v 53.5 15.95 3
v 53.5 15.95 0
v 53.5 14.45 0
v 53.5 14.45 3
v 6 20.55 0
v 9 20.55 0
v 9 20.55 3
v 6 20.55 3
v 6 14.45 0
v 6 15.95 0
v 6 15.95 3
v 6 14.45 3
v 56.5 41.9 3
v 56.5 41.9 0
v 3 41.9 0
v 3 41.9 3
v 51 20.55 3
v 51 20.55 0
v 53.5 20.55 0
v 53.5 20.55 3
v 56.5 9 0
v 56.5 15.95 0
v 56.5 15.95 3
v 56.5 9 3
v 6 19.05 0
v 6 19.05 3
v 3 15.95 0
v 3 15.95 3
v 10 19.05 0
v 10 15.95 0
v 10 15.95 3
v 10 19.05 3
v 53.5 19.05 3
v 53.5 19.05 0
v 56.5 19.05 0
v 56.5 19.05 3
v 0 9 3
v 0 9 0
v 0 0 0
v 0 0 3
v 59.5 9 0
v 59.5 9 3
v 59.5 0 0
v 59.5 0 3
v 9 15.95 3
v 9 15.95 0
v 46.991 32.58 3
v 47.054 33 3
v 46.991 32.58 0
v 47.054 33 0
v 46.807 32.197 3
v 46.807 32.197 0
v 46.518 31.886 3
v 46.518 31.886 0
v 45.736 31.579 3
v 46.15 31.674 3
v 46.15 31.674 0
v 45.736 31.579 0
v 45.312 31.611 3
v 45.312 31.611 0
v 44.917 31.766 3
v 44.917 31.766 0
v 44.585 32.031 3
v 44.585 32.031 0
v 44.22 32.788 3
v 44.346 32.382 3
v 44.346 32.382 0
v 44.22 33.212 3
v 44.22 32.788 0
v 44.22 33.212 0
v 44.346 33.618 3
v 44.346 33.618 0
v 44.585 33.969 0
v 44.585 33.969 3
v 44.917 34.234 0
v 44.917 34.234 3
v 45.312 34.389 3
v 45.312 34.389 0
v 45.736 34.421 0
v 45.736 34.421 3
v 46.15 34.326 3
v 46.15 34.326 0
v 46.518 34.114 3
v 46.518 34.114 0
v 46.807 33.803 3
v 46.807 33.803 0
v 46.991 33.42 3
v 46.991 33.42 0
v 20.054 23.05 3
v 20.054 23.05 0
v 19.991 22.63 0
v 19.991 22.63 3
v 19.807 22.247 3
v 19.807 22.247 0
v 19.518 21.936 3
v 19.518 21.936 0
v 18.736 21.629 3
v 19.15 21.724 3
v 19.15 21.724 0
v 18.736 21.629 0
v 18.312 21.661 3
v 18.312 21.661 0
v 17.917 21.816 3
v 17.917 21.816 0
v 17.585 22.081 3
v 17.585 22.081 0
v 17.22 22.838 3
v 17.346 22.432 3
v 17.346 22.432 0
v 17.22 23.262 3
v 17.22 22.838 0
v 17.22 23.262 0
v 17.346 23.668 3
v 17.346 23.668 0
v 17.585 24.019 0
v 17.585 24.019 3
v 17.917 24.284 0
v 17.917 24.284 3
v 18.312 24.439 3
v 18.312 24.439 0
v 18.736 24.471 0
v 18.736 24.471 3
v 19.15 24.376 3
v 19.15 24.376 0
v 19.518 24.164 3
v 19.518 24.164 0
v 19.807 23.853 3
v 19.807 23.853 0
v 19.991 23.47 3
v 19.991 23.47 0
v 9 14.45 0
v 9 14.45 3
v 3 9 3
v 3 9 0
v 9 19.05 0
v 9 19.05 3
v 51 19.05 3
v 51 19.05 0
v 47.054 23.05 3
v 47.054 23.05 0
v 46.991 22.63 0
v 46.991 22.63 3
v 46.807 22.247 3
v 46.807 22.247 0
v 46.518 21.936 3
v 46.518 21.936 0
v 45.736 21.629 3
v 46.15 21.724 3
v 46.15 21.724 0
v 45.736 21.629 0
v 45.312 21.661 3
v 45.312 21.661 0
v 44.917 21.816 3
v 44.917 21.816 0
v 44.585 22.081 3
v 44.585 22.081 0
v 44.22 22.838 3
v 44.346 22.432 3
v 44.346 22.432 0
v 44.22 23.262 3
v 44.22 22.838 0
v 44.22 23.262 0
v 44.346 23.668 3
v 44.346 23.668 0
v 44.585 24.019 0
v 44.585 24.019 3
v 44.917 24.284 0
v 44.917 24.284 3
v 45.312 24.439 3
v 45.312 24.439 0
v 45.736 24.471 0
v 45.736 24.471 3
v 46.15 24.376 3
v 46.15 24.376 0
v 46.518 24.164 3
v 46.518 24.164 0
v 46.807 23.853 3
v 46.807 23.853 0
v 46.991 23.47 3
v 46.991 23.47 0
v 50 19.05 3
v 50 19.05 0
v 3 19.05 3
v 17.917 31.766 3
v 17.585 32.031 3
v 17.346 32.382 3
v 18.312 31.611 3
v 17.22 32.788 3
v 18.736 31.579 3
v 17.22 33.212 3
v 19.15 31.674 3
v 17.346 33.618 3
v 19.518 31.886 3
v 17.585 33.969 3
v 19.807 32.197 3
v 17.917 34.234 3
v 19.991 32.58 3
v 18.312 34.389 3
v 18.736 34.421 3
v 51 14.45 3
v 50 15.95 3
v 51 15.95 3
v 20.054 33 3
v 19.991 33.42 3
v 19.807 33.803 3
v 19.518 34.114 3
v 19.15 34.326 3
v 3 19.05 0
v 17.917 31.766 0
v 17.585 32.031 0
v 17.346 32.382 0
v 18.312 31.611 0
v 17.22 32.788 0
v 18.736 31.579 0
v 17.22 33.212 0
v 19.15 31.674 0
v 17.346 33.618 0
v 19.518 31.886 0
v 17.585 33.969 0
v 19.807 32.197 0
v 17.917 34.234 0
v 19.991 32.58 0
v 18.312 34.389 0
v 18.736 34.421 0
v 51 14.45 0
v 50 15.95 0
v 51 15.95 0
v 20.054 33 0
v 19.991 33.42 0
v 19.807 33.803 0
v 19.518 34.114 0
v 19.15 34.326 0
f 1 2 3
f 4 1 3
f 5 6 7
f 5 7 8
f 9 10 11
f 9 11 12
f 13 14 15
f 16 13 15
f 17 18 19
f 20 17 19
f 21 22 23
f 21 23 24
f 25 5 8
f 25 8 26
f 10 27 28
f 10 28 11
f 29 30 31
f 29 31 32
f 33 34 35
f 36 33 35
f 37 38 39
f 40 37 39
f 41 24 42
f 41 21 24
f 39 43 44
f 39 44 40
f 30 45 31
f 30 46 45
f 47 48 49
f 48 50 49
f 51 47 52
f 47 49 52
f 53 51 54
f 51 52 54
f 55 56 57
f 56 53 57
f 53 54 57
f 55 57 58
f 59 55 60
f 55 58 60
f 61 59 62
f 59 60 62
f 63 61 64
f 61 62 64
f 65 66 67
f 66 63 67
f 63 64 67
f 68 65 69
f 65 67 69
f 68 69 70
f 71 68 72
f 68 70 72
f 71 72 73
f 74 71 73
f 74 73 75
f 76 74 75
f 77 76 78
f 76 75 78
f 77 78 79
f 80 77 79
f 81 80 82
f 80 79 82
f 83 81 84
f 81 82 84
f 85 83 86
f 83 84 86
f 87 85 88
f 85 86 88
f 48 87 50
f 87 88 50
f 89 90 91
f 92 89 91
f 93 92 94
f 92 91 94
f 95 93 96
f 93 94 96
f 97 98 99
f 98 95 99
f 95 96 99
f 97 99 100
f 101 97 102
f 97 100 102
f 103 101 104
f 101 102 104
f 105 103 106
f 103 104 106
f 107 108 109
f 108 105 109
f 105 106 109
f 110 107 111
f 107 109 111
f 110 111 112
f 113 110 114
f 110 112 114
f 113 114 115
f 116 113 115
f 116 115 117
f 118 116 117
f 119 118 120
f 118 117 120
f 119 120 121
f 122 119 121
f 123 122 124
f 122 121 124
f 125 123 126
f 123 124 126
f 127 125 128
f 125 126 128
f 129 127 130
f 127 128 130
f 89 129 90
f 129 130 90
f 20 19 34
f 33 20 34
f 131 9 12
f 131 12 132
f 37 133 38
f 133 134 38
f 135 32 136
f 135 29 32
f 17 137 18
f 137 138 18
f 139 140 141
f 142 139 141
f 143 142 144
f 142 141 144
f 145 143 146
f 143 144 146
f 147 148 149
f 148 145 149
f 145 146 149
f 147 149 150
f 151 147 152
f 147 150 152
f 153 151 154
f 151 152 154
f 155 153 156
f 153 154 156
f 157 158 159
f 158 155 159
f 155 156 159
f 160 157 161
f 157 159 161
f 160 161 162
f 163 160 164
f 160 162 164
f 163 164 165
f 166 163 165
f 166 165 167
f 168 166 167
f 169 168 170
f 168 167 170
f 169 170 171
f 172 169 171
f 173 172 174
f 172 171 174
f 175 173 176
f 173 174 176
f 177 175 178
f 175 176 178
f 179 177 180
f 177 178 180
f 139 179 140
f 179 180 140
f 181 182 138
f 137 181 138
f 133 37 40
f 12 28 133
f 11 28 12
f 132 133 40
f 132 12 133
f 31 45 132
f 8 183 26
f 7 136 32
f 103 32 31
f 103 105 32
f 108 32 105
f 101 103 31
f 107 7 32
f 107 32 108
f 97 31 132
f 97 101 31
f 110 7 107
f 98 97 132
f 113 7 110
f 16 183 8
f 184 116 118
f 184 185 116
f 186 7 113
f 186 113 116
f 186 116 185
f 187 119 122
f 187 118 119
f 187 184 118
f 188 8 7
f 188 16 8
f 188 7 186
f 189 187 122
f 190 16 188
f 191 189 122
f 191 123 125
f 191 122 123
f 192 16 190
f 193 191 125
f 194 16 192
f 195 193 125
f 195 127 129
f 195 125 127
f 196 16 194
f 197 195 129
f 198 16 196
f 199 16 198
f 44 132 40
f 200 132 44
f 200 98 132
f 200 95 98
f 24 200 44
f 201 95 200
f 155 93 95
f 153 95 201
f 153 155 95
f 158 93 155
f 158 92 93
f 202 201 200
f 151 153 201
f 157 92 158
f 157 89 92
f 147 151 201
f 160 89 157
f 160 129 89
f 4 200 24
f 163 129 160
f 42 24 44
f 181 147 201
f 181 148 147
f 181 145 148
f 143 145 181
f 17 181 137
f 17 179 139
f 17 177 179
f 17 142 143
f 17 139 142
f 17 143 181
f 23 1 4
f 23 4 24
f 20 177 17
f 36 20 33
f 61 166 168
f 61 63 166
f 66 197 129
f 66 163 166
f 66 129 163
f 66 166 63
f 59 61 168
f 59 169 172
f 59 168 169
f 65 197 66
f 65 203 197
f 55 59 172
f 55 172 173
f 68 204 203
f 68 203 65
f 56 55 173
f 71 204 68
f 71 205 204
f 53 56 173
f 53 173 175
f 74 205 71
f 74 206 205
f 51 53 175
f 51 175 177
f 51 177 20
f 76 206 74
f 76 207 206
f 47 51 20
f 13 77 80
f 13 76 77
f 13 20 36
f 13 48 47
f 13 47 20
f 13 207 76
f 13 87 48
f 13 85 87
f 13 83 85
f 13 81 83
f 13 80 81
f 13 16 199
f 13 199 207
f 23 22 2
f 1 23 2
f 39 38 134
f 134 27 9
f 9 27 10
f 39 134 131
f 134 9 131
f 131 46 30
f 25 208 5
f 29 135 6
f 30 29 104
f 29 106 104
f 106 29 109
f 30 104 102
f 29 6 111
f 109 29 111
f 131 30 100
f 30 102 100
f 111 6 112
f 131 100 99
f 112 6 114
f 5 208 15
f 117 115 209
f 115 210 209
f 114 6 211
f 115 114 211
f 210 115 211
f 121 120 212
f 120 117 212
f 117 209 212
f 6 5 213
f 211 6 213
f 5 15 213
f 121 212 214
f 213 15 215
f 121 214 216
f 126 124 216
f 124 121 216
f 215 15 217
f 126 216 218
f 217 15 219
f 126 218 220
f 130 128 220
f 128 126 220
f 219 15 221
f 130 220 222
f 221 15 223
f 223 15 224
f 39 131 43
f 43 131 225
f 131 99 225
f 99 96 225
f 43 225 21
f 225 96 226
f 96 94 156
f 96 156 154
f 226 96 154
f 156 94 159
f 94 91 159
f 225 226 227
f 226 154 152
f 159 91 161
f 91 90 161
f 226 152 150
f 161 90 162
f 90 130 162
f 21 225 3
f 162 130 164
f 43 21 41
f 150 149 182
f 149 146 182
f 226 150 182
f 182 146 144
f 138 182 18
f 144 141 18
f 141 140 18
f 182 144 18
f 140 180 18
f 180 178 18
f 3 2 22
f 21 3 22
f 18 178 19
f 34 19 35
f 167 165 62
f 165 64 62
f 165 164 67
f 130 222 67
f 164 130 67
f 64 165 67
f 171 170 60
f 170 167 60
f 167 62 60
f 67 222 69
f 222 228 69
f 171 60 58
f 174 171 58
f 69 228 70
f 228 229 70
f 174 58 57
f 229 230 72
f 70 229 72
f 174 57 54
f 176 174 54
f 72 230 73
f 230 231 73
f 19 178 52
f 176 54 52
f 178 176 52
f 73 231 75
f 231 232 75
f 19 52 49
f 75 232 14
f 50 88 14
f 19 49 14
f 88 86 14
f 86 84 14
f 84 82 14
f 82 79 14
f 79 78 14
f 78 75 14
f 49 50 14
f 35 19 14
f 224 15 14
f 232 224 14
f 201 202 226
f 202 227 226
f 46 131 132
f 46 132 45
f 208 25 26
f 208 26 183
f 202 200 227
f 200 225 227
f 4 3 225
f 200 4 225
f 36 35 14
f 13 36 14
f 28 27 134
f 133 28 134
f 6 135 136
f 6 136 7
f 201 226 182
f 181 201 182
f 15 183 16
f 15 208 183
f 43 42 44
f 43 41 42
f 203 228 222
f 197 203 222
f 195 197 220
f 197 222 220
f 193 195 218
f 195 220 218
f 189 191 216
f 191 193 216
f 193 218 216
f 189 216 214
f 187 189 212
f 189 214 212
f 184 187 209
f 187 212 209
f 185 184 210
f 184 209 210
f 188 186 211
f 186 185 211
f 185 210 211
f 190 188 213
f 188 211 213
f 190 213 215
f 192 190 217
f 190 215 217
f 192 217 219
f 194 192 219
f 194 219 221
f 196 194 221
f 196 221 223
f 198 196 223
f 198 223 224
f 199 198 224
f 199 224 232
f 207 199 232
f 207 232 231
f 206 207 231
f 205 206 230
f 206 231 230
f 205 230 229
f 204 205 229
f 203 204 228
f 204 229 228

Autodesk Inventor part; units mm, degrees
ref_plane "YZ Plane" through (0, 0, 0) normal (1, 0, 0) x (0, 1, 0)
ref_plane "XZ Plane" through (0, 0, 0) normal (0, 1, 0) x (-1, 0, 0)
ref_plane "XY Plane" through (0, 0, 0) normal (0, 0, 1) x (1, 0, 0)
sketch "Sketch1" plane through (0, 0, 0) normal (0, 0, 1) x (1, 0, 0)
  line L0 (50, 15.95) -> (50, 19.05)
  line L1 (56.5, 15.95) -> (53.5, 15.95)
  line L2 (51, 15.95) -> (51, 15.95)
  line L3 (53.5, 14.45) -> (51, 14.45)
  line L4 (51, 20.55) -> (53.5, 20.55)
  line L5 (51, 14.45) -> (51, 15.95)
  line L6 (51, 19.05) -> (51, 20.55)
  line L7 (50, 19.05) -> (51, 19.05)
  line L8 (53.5, 19.05) -> (56.5, 19.05)
  line L9 (56.5, 15.95) -> (53.5, 15.95)
  line L10 (51, 15.95) -> (50, 15.95)
  line L11 (53.5, 20.55) -> (53.5, 19.05)
  line L12 (53.5, 15.95) -> (53.5, 14.45)
  line L13 (10, 15.95) -> (10, 19.05)
  line L14 (10, 19.05) -> (9, 19.05)
  line L15 (9, 14.45) -> (9, 15.95)
  line L16 (9, 19.05) -> (9, 20.55)
  line L17 (6, 20.55) -> (6, 19.05)
  line L18 (9, 20.55) -> (6, 20.55)
  line L19 (6, 15.95) -> (6, 14.45)
  line L20 (6, 19.05) -> (3, 19.05)
  line L21 (3, 15.95) -> (6, 15.95)
  line L22 (3, 15.95) -> (6, 15.95)
  line L23 (6, 14.45) -> (9, 14.45)
  line L24 (56.5, 19.05) -> (56.5, 41.9)
  line L25 (3, 15.95) -> (3, 9)
  line L26 (3, 9) -> (0, 9)
  line L27 (0, 9) -> (0, 0)
  line L28 (3, 19.05) -> (3, 41.9)
  line L29 (56.5, 41.9) -> (3, 41.9)
  line L30 (9, 15.95) -> (10, 15.95)
  line L31 (56.5, 15.95) -> (56.5, 9)
  line L32 (56.5, 9) -> (59.5, 9)
  line L33 (59.5, 9) -> (59.5, 0)
  line L34 (59.5, 0) -> (0, 0)
  circle A0 centre (45.6295, 23.05) radius 1.425 projected
  circle A1 centre (18.6295, 23.05) radius 1.425 projected
  circle A2 centre (18.6295, 33) radius 1.425 projected
  circle A3 centre (45.6295, 33) radius 1.425 projected
  circle A4 centre (45.6295, 23.05) radius 1.425
  circle A5 centre (45.6295, 33) radius 1.425
  circle A6 centre (18.6295, 33) radius 1.425
  circle A7 centre (18.6295, 23.05) radius 1.425
  line L35 (59.5, 9) -> (59.5, 17.5) construction
  line L36 (59.5, 17.5) -> (59.5, 15.95) construction
  line L37 (59.5, 15.95) -> (56.5, 15.95) construction
  dimension "d54" = 3.1
  dimension "d70" = 3.1
  dimension "d74" = 1.5
  dimension "d83" = 3
  dimension "d85" = 3.1
  dimension "d87" = 3
  dimension "d100" = 9
  dimension "d102" = 3.1
  dimension "d103" = 0
  dimension "d104" = 0
  dimension "d105" = 53.5
  dimension "d108" = 3
  dimension "d109" = 9
  dimension "d110" = 9
  dimension "d111" = 0
  dimension "d112" = 3
  dimension "d113" = 3
  dimension "d114" = 2.5
  dimension "d115" = 1
  dimension "d116" = 1
  dimension "d117" = 1.5
  dimension "d121" = 8.5
  dimension "d122" = 1.55
  dimension "d123" = 6.95
  dimension "d124" = 6.95
  dimension "d125" = 1
  dimension "d126" = 1
  dimension "d127" = 3
  dimension "d128" = 3
  dimension "d129" = 1.5
  dimension "d130" = 1.5
  dimension "d131" = 0
  dimension "d132" = 1.5
  dimension "d133" = 1.5
  dimension "d134" = 1.5
  dimension "d136" = 27
  dimension "d137" = 9.95
extrude "Extrusion1" add sketch "Sketch1" along normal blind 3
properties part number "Muñeca1"
